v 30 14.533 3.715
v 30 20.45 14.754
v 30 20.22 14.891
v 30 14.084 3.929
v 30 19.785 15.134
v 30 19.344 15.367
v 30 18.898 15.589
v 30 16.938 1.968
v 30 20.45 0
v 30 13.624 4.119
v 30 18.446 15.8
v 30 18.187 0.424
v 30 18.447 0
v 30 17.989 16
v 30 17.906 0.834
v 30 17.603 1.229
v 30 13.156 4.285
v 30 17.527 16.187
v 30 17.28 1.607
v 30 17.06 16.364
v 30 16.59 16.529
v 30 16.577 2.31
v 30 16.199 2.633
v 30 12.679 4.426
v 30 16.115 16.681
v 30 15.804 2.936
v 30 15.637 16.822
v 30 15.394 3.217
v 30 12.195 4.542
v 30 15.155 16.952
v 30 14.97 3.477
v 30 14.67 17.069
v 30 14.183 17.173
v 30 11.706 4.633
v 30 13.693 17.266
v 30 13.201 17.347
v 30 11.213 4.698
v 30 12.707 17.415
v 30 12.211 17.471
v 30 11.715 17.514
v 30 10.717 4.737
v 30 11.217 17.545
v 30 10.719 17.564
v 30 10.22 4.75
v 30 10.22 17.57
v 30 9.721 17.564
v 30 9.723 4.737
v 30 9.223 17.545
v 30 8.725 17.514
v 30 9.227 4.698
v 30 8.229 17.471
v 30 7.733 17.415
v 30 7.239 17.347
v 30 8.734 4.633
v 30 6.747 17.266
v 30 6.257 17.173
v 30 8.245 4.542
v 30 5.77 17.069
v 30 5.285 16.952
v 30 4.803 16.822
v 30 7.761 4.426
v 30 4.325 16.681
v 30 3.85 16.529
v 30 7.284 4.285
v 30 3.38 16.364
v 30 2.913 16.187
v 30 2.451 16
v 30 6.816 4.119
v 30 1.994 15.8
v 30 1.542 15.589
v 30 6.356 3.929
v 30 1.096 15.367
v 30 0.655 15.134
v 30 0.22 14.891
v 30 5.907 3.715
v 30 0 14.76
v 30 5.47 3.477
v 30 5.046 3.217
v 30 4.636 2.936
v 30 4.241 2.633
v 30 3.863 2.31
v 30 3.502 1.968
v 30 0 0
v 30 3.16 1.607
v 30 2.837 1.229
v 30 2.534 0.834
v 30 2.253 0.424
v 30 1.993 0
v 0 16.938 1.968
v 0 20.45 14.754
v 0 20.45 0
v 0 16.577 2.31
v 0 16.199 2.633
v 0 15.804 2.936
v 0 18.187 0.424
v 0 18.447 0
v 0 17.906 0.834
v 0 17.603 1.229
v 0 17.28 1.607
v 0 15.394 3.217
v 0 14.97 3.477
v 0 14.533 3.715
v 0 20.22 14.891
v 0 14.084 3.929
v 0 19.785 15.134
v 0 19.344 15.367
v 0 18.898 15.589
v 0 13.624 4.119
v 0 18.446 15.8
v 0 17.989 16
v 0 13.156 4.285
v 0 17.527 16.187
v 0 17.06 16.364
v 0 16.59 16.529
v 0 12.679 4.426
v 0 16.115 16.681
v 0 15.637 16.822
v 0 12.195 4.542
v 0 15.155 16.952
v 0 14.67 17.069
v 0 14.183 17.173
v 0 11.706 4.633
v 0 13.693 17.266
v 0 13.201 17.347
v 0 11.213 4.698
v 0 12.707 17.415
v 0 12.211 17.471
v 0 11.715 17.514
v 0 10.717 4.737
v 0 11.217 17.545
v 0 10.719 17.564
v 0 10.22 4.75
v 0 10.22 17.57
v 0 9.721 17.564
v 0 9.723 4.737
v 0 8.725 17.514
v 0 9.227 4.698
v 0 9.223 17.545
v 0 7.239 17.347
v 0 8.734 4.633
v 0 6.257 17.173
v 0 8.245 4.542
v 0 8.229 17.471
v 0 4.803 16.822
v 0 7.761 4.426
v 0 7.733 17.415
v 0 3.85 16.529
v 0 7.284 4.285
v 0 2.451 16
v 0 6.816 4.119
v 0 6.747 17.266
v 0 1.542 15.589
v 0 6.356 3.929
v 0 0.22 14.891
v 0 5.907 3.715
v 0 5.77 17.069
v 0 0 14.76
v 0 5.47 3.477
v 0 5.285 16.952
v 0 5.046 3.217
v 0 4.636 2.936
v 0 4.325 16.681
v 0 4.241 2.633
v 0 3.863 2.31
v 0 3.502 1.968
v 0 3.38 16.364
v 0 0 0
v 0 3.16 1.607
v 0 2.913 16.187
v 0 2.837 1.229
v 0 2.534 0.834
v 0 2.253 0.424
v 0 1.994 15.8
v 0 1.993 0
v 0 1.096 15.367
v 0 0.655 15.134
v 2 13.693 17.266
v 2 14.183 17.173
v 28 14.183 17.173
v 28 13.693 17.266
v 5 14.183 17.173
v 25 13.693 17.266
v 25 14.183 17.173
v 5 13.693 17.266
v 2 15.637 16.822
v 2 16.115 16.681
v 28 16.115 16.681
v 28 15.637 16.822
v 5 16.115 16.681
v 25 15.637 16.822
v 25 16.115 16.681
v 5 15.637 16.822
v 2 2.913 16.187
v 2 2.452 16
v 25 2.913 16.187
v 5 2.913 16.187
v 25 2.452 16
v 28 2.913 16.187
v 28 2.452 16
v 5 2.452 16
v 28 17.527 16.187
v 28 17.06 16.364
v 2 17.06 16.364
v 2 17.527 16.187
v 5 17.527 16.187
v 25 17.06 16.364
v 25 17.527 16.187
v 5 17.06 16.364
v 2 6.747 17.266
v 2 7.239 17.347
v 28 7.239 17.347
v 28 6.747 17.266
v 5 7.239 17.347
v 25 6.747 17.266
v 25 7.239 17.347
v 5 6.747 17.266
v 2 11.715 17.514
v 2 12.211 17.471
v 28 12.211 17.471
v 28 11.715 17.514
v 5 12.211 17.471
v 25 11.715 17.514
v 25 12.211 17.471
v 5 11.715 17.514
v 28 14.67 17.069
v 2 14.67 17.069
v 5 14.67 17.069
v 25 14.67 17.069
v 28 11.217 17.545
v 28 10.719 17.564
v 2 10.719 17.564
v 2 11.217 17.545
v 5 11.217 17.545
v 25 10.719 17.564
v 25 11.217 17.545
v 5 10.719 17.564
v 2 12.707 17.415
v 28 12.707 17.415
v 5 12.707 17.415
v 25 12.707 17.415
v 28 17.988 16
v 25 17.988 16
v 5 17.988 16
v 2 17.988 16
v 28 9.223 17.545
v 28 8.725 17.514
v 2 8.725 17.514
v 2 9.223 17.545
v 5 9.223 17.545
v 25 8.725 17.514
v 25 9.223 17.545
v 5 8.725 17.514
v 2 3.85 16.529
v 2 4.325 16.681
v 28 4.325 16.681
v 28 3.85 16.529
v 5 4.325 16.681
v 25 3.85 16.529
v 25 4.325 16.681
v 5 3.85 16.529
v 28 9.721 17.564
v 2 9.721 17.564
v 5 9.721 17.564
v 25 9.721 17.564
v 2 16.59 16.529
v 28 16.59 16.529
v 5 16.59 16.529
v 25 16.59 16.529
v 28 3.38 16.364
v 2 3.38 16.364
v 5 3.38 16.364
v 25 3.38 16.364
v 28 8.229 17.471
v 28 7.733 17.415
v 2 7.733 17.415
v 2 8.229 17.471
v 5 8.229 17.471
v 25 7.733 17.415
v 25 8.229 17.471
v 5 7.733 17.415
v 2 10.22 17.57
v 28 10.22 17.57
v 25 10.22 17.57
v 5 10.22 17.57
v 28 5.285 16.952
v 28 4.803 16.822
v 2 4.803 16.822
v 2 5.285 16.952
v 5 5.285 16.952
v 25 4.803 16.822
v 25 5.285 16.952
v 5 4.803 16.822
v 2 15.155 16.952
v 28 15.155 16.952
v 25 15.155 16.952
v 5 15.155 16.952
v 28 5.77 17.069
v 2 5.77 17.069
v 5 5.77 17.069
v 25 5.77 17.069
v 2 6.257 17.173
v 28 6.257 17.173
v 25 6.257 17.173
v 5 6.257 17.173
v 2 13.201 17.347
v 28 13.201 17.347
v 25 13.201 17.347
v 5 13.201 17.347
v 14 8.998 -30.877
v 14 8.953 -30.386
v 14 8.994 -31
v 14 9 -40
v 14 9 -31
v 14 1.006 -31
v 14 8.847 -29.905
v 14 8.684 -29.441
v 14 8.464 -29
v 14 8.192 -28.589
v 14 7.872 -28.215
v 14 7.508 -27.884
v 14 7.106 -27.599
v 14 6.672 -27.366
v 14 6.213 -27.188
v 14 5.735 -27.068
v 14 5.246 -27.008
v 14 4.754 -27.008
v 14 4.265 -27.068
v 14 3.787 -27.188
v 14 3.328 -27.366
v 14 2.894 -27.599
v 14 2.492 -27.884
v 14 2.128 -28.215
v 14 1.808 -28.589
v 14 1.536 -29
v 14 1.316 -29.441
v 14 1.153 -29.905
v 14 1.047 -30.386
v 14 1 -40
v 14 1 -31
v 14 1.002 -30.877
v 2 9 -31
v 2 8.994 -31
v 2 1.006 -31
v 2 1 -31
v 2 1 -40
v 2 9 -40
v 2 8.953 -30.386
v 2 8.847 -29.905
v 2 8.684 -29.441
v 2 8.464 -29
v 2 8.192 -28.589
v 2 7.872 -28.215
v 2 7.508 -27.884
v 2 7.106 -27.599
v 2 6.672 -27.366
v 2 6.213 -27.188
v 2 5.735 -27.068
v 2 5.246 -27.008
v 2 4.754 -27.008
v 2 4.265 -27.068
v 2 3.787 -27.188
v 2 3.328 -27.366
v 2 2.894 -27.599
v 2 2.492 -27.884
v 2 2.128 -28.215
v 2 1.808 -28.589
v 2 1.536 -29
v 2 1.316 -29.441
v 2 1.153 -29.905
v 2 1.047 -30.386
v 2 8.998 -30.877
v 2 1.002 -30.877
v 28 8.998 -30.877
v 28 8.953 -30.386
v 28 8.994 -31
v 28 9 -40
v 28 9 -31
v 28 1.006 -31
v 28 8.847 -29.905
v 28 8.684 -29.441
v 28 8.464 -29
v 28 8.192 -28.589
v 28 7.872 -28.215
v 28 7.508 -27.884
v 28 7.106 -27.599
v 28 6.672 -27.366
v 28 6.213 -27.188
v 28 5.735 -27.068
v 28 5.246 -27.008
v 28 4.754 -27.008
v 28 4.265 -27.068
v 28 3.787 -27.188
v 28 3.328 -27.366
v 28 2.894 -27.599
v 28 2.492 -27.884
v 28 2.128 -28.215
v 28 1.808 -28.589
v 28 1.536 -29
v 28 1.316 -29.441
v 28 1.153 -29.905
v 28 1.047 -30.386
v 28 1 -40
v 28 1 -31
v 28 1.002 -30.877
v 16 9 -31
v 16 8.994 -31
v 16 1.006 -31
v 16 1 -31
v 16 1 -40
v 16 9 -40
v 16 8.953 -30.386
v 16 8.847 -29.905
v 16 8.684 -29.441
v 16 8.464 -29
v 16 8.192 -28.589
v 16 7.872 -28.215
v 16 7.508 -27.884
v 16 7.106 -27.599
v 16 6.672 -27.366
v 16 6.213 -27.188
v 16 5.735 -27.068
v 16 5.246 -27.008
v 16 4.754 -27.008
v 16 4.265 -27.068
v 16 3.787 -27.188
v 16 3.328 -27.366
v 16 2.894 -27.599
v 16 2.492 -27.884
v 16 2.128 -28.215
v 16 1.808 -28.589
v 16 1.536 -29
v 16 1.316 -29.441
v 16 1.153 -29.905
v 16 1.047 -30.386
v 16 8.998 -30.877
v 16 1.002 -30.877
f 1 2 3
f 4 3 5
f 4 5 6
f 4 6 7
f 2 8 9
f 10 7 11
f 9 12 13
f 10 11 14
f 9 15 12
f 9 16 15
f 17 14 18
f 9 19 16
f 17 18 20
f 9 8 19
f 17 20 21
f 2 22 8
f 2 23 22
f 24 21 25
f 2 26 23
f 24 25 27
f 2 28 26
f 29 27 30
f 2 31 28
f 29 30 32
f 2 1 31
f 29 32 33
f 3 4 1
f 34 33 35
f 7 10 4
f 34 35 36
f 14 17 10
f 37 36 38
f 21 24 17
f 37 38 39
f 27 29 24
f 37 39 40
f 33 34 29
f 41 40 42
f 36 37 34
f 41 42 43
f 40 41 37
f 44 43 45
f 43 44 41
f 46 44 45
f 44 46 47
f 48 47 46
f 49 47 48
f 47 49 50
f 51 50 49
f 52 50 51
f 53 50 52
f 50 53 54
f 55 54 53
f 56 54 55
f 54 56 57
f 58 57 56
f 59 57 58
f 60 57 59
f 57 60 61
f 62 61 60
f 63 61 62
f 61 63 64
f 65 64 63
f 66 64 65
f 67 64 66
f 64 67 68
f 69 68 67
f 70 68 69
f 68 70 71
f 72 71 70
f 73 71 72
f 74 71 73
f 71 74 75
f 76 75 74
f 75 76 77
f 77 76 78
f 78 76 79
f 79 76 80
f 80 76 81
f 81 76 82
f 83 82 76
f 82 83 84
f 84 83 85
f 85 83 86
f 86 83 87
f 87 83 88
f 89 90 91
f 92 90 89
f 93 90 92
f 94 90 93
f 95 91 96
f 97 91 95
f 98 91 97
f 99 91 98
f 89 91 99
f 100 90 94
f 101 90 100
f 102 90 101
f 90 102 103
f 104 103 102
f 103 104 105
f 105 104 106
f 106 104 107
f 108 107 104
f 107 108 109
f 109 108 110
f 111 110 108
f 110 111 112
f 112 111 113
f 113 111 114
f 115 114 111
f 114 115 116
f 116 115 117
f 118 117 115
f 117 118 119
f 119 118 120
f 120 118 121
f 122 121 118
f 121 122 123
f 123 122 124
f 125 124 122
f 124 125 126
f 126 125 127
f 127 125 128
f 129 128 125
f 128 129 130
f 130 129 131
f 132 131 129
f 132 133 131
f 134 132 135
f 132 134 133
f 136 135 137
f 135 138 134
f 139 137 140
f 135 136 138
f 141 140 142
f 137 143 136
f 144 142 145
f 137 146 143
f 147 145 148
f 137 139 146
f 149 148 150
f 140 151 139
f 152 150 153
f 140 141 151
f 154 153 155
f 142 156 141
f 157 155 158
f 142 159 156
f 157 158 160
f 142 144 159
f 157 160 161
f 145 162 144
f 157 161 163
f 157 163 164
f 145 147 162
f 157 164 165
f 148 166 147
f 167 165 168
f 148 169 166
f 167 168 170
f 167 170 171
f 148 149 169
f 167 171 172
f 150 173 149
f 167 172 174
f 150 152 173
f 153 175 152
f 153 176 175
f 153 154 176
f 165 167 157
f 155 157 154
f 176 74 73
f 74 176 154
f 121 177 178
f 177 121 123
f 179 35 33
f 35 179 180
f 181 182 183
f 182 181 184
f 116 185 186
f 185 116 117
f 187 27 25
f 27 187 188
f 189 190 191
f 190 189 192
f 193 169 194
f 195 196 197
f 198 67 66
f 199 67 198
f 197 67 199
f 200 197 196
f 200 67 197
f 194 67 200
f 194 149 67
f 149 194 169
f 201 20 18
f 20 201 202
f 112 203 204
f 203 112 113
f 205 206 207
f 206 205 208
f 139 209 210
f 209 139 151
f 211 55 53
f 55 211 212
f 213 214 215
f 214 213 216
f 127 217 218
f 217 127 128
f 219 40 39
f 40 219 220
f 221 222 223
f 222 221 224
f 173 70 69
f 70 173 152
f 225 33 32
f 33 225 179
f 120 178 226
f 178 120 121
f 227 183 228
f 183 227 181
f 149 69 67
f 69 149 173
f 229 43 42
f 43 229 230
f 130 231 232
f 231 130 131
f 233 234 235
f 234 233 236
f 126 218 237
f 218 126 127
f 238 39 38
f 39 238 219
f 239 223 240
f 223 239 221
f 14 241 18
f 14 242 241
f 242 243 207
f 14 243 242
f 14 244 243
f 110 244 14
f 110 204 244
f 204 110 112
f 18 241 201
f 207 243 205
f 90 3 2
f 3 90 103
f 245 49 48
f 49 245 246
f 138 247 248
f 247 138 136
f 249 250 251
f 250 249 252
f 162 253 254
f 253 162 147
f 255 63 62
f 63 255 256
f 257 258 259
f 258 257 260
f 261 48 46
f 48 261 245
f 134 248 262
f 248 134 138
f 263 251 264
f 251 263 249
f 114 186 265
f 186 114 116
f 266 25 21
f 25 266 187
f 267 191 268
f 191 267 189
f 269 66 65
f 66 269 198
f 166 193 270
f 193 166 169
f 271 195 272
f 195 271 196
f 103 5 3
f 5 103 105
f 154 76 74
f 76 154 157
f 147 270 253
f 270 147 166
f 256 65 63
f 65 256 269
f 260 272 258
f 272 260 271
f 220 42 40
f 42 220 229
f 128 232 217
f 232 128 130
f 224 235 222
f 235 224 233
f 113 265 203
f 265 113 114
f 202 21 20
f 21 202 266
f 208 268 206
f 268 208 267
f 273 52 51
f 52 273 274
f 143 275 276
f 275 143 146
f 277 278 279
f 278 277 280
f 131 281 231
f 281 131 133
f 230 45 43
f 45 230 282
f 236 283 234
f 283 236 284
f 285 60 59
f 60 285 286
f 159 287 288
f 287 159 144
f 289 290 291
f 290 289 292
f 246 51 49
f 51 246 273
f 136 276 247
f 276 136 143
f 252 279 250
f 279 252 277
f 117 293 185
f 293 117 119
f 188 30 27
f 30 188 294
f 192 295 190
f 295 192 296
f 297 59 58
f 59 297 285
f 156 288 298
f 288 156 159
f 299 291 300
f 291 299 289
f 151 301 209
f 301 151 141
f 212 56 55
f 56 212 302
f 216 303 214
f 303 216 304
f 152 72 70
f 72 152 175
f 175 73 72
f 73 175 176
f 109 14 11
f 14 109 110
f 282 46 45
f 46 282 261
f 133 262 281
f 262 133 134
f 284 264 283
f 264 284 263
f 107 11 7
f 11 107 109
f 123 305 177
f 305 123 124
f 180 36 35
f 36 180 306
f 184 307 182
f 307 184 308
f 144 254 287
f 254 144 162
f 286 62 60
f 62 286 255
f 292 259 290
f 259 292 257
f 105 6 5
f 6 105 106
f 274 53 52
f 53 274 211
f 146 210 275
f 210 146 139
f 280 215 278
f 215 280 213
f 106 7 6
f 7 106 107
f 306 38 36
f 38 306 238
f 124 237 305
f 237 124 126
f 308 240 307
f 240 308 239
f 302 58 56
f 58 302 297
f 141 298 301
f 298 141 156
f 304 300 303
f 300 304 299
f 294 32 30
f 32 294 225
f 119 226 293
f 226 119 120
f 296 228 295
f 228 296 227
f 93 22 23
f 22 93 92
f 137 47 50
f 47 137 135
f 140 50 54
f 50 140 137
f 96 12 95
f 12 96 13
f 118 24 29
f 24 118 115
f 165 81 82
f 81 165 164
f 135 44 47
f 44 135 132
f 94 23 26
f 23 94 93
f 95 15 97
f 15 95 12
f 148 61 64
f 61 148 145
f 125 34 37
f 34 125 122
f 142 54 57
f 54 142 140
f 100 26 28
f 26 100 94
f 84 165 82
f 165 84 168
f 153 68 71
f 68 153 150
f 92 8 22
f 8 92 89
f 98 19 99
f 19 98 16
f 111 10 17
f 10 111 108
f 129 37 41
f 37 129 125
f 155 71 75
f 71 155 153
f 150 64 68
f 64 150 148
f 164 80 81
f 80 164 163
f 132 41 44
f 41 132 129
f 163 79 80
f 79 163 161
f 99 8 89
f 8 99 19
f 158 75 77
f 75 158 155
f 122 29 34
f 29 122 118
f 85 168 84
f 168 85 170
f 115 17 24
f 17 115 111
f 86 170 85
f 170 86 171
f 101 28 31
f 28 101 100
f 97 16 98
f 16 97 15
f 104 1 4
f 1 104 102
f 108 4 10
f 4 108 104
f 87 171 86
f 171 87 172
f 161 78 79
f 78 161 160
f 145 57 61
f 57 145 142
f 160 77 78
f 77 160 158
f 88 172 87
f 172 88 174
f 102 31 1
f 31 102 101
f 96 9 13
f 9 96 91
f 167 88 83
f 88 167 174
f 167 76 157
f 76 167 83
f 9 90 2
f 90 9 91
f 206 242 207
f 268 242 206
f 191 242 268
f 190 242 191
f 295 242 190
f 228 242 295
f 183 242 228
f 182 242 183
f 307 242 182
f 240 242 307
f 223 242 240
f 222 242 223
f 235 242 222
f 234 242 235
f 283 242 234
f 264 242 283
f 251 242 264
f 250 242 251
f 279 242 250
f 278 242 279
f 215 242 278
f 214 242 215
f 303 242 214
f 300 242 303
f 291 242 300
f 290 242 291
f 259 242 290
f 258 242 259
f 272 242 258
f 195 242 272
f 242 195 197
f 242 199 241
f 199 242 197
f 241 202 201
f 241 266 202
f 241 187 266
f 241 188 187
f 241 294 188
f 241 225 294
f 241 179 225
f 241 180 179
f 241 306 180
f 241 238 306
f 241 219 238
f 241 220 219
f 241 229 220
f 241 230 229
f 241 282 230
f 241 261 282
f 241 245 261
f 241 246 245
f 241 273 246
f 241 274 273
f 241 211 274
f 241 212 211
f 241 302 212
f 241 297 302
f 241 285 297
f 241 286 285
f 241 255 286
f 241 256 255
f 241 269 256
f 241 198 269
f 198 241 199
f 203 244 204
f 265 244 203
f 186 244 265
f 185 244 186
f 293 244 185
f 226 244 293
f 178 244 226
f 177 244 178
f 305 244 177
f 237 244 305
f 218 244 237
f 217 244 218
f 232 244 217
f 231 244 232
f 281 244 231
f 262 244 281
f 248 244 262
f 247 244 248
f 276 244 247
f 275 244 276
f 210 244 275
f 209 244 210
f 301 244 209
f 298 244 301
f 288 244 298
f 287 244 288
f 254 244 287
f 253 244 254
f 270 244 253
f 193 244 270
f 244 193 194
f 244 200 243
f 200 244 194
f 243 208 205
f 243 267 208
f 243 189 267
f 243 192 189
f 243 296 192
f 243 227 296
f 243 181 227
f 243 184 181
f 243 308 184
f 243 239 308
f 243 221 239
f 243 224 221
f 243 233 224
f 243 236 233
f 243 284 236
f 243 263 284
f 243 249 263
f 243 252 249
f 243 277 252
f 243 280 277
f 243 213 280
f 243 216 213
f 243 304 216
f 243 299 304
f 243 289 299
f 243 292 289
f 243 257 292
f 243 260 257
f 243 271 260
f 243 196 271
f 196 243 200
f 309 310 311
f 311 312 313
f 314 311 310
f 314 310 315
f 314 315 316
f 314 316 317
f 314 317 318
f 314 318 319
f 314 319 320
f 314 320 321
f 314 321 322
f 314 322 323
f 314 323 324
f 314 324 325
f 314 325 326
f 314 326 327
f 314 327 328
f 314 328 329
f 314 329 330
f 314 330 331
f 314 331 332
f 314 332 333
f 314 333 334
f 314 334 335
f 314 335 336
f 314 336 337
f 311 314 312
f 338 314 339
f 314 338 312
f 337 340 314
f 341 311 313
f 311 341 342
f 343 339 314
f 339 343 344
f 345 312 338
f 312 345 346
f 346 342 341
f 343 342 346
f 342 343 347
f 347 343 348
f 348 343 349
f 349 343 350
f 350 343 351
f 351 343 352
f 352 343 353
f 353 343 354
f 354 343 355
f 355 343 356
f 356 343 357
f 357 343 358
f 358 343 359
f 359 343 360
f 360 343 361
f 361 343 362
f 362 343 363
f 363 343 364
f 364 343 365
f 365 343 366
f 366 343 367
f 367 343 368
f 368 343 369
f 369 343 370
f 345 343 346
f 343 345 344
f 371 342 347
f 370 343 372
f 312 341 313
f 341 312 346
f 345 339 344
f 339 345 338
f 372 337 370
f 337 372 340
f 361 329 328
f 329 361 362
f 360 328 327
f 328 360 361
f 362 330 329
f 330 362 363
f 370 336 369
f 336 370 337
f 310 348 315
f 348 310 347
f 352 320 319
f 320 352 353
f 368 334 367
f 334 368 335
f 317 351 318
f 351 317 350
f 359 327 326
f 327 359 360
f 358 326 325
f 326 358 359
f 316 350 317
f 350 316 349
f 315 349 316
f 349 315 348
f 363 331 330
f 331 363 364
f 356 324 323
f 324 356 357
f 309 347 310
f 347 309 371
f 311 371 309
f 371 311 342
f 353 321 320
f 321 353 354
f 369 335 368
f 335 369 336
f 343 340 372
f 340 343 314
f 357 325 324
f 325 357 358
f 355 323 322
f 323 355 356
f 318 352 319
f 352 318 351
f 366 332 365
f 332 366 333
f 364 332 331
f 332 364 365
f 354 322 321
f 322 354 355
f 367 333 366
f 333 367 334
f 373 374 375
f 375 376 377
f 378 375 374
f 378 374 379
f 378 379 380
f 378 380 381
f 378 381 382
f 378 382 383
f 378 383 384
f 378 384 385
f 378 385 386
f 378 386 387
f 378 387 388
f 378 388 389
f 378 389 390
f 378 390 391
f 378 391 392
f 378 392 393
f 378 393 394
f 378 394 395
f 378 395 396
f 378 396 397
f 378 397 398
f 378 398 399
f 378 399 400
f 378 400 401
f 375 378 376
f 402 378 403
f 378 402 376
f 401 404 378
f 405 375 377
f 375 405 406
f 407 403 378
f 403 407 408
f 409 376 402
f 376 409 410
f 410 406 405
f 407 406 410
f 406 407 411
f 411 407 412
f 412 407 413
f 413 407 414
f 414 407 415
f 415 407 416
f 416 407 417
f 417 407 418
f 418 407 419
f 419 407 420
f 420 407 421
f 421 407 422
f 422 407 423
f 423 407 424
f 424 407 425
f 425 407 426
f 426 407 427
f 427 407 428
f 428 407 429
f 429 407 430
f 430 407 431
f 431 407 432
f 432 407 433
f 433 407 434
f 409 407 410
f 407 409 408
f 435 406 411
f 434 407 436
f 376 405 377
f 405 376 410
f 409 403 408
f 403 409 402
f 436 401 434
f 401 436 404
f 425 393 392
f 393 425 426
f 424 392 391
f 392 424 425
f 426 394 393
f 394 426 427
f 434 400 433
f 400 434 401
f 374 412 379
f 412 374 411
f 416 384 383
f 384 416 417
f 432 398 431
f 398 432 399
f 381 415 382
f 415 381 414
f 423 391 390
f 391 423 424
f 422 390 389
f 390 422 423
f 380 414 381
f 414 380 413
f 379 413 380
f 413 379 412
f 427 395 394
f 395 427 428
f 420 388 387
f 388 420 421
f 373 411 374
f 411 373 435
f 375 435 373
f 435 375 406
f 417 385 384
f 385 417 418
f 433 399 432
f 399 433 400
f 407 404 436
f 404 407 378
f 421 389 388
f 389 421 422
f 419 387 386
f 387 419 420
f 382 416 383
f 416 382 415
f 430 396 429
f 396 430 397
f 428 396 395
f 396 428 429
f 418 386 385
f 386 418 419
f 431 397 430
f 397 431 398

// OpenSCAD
$fa=0.5;
$fs=0.5;
translate([0,0,0]) {
}
difference() {
    union() {
      cube([30,20.45,4.75]);
      rotate([0,90,0])
      translate([2.43,10.22,0])
      cylinder(30,20,20,center=false);
    }
    translate([-1,10.22,-4.75]) {
      rotate([0,90,0])
      cylinder(32,9.5,9.5,center=false);
    }
    translate([-1,-15,-50])
    cube([32,50,50]);
    translate([-1,-10,-1])
    cube([32,10,20]);
    translate([-1,20.45,-1])
    cube([32,10,20]);
    translate([28,-1,16]) {
        rotate([0,0,90])
        cube([22,3,3]);
    }
    translate([5,-1,16]) {
        rotate([0,0,90])
        cube([22,3,3]);
    }
}

translate([0,0,-40]) {
    translate([2,1,0]) {
        union() {
          cube([12,8,9]);
          rotate([0,90,0])
          translate([-9,4,0])
          cylinder(12,4,4,center=false);
        }
    }
    translate([16,1,0]) {
        union() {
          cube([12,8,9]);
          rotate([0,90,0])
          translate([-9,4,0])
          cylinder(12,4,4,center=false);
        }
    }
}
